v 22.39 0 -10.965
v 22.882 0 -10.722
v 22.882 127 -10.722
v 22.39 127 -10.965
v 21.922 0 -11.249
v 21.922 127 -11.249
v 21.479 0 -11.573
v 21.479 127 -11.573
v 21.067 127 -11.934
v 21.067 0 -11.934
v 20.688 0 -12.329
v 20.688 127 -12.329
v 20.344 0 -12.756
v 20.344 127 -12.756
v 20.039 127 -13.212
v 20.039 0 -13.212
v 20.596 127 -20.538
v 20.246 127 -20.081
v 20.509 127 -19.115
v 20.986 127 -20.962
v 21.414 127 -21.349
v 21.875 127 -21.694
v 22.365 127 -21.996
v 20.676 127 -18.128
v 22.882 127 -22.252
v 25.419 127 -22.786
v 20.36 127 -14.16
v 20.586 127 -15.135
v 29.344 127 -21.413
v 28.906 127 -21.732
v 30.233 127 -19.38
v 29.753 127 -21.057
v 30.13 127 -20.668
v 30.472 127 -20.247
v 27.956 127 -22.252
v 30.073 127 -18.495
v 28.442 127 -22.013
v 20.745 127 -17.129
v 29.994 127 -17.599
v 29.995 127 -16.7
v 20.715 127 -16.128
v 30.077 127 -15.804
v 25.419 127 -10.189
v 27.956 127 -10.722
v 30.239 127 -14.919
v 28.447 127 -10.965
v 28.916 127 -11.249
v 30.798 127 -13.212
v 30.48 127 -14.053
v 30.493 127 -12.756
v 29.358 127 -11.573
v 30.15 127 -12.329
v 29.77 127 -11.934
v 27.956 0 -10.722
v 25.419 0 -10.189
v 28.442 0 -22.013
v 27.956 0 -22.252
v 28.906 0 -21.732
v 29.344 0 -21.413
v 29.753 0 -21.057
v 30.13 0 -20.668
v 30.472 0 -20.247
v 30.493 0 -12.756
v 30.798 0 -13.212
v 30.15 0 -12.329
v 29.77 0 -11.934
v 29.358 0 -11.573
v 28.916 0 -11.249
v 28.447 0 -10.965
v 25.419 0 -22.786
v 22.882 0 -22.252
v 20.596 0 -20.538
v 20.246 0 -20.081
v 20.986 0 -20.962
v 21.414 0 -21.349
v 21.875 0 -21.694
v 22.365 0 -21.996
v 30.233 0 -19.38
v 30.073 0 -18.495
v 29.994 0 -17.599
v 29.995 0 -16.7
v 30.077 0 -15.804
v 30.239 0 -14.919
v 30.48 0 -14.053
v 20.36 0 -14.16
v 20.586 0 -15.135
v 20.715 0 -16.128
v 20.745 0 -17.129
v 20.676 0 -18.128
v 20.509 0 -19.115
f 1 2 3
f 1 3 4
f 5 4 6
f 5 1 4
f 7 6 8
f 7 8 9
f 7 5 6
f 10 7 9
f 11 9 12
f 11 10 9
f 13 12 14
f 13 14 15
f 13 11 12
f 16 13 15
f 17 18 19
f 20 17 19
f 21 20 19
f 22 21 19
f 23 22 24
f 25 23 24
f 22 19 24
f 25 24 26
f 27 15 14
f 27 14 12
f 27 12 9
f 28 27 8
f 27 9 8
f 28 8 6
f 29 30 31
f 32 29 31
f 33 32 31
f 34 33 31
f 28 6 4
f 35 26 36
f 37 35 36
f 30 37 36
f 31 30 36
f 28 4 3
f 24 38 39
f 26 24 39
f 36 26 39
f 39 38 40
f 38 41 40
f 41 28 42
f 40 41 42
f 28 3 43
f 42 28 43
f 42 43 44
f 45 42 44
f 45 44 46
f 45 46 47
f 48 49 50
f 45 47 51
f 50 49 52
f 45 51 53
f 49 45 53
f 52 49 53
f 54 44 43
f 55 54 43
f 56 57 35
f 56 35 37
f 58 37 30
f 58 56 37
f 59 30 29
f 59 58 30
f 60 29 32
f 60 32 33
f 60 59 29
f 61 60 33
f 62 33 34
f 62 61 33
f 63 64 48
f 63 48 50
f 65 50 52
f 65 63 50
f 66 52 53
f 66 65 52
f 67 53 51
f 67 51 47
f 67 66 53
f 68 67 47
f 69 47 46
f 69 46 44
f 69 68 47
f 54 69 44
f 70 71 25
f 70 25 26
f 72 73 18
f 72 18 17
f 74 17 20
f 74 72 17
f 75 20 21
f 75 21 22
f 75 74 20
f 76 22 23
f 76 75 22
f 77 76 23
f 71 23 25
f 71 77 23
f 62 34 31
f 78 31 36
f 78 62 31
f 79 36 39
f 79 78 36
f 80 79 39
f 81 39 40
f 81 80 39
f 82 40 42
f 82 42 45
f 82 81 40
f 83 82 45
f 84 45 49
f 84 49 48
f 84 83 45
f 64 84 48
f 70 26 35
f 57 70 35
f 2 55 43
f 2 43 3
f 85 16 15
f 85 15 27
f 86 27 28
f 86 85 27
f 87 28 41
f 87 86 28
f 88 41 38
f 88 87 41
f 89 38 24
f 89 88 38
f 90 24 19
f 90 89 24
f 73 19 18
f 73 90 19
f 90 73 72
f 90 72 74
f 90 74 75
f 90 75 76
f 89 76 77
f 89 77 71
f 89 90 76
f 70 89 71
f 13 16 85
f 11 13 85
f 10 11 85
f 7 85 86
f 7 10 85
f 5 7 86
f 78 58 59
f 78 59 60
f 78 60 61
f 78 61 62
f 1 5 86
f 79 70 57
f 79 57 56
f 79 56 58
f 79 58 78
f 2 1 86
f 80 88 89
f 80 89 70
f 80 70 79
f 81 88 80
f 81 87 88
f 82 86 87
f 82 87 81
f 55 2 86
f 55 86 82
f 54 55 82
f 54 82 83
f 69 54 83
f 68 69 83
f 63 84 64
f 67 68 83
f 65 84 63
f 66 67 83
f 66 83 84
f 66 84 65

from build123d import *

# Parameters (mm, degrees)
F1_DEPTH = 127


with BuildPart() as f1:
    # F0 (on Front) → F1 (new body)
    with BuildSketch(Plane.XZ):
        with BuildLine():
            Line((25.418775, -10.188777), (22.881775, -10.722313))
            ThreePointArc((22.881775, -10.722313), (21.269347, -11.748756), (20.039052, -13.211589))
            ThreePointArc((20.039052, -13.211589), (20.74222, -16.628007), (20.245645, -20.08051))
            ThreePointArc((20.245645, -20.08051), (21.413679, -21.348552), (22.881775, -22.252392))
            Line((22.881775, -22.252392), (25.418775, -22.785928))
            Line((25.418775, -22.785928), (27.955776, -22.252392))
            ThreePointArc((27.955776, -22.252392), (29.344167, -21.413137), (30.472134, -20.247089))
            ThreePointArc((30.472134, -20.247089), (29.994965, -16.699634), (30.798498, -13.211589))
            ThreePointArc((30.798498, -13.211589), (29.568203, -11.748756), (27.955776, -10.722313))
            Line((27.955776, -10.722313), (25.418775, -10.188777))
        make_face()
    extrude(amount=-F1_DEPTH)


solid = f1.part
